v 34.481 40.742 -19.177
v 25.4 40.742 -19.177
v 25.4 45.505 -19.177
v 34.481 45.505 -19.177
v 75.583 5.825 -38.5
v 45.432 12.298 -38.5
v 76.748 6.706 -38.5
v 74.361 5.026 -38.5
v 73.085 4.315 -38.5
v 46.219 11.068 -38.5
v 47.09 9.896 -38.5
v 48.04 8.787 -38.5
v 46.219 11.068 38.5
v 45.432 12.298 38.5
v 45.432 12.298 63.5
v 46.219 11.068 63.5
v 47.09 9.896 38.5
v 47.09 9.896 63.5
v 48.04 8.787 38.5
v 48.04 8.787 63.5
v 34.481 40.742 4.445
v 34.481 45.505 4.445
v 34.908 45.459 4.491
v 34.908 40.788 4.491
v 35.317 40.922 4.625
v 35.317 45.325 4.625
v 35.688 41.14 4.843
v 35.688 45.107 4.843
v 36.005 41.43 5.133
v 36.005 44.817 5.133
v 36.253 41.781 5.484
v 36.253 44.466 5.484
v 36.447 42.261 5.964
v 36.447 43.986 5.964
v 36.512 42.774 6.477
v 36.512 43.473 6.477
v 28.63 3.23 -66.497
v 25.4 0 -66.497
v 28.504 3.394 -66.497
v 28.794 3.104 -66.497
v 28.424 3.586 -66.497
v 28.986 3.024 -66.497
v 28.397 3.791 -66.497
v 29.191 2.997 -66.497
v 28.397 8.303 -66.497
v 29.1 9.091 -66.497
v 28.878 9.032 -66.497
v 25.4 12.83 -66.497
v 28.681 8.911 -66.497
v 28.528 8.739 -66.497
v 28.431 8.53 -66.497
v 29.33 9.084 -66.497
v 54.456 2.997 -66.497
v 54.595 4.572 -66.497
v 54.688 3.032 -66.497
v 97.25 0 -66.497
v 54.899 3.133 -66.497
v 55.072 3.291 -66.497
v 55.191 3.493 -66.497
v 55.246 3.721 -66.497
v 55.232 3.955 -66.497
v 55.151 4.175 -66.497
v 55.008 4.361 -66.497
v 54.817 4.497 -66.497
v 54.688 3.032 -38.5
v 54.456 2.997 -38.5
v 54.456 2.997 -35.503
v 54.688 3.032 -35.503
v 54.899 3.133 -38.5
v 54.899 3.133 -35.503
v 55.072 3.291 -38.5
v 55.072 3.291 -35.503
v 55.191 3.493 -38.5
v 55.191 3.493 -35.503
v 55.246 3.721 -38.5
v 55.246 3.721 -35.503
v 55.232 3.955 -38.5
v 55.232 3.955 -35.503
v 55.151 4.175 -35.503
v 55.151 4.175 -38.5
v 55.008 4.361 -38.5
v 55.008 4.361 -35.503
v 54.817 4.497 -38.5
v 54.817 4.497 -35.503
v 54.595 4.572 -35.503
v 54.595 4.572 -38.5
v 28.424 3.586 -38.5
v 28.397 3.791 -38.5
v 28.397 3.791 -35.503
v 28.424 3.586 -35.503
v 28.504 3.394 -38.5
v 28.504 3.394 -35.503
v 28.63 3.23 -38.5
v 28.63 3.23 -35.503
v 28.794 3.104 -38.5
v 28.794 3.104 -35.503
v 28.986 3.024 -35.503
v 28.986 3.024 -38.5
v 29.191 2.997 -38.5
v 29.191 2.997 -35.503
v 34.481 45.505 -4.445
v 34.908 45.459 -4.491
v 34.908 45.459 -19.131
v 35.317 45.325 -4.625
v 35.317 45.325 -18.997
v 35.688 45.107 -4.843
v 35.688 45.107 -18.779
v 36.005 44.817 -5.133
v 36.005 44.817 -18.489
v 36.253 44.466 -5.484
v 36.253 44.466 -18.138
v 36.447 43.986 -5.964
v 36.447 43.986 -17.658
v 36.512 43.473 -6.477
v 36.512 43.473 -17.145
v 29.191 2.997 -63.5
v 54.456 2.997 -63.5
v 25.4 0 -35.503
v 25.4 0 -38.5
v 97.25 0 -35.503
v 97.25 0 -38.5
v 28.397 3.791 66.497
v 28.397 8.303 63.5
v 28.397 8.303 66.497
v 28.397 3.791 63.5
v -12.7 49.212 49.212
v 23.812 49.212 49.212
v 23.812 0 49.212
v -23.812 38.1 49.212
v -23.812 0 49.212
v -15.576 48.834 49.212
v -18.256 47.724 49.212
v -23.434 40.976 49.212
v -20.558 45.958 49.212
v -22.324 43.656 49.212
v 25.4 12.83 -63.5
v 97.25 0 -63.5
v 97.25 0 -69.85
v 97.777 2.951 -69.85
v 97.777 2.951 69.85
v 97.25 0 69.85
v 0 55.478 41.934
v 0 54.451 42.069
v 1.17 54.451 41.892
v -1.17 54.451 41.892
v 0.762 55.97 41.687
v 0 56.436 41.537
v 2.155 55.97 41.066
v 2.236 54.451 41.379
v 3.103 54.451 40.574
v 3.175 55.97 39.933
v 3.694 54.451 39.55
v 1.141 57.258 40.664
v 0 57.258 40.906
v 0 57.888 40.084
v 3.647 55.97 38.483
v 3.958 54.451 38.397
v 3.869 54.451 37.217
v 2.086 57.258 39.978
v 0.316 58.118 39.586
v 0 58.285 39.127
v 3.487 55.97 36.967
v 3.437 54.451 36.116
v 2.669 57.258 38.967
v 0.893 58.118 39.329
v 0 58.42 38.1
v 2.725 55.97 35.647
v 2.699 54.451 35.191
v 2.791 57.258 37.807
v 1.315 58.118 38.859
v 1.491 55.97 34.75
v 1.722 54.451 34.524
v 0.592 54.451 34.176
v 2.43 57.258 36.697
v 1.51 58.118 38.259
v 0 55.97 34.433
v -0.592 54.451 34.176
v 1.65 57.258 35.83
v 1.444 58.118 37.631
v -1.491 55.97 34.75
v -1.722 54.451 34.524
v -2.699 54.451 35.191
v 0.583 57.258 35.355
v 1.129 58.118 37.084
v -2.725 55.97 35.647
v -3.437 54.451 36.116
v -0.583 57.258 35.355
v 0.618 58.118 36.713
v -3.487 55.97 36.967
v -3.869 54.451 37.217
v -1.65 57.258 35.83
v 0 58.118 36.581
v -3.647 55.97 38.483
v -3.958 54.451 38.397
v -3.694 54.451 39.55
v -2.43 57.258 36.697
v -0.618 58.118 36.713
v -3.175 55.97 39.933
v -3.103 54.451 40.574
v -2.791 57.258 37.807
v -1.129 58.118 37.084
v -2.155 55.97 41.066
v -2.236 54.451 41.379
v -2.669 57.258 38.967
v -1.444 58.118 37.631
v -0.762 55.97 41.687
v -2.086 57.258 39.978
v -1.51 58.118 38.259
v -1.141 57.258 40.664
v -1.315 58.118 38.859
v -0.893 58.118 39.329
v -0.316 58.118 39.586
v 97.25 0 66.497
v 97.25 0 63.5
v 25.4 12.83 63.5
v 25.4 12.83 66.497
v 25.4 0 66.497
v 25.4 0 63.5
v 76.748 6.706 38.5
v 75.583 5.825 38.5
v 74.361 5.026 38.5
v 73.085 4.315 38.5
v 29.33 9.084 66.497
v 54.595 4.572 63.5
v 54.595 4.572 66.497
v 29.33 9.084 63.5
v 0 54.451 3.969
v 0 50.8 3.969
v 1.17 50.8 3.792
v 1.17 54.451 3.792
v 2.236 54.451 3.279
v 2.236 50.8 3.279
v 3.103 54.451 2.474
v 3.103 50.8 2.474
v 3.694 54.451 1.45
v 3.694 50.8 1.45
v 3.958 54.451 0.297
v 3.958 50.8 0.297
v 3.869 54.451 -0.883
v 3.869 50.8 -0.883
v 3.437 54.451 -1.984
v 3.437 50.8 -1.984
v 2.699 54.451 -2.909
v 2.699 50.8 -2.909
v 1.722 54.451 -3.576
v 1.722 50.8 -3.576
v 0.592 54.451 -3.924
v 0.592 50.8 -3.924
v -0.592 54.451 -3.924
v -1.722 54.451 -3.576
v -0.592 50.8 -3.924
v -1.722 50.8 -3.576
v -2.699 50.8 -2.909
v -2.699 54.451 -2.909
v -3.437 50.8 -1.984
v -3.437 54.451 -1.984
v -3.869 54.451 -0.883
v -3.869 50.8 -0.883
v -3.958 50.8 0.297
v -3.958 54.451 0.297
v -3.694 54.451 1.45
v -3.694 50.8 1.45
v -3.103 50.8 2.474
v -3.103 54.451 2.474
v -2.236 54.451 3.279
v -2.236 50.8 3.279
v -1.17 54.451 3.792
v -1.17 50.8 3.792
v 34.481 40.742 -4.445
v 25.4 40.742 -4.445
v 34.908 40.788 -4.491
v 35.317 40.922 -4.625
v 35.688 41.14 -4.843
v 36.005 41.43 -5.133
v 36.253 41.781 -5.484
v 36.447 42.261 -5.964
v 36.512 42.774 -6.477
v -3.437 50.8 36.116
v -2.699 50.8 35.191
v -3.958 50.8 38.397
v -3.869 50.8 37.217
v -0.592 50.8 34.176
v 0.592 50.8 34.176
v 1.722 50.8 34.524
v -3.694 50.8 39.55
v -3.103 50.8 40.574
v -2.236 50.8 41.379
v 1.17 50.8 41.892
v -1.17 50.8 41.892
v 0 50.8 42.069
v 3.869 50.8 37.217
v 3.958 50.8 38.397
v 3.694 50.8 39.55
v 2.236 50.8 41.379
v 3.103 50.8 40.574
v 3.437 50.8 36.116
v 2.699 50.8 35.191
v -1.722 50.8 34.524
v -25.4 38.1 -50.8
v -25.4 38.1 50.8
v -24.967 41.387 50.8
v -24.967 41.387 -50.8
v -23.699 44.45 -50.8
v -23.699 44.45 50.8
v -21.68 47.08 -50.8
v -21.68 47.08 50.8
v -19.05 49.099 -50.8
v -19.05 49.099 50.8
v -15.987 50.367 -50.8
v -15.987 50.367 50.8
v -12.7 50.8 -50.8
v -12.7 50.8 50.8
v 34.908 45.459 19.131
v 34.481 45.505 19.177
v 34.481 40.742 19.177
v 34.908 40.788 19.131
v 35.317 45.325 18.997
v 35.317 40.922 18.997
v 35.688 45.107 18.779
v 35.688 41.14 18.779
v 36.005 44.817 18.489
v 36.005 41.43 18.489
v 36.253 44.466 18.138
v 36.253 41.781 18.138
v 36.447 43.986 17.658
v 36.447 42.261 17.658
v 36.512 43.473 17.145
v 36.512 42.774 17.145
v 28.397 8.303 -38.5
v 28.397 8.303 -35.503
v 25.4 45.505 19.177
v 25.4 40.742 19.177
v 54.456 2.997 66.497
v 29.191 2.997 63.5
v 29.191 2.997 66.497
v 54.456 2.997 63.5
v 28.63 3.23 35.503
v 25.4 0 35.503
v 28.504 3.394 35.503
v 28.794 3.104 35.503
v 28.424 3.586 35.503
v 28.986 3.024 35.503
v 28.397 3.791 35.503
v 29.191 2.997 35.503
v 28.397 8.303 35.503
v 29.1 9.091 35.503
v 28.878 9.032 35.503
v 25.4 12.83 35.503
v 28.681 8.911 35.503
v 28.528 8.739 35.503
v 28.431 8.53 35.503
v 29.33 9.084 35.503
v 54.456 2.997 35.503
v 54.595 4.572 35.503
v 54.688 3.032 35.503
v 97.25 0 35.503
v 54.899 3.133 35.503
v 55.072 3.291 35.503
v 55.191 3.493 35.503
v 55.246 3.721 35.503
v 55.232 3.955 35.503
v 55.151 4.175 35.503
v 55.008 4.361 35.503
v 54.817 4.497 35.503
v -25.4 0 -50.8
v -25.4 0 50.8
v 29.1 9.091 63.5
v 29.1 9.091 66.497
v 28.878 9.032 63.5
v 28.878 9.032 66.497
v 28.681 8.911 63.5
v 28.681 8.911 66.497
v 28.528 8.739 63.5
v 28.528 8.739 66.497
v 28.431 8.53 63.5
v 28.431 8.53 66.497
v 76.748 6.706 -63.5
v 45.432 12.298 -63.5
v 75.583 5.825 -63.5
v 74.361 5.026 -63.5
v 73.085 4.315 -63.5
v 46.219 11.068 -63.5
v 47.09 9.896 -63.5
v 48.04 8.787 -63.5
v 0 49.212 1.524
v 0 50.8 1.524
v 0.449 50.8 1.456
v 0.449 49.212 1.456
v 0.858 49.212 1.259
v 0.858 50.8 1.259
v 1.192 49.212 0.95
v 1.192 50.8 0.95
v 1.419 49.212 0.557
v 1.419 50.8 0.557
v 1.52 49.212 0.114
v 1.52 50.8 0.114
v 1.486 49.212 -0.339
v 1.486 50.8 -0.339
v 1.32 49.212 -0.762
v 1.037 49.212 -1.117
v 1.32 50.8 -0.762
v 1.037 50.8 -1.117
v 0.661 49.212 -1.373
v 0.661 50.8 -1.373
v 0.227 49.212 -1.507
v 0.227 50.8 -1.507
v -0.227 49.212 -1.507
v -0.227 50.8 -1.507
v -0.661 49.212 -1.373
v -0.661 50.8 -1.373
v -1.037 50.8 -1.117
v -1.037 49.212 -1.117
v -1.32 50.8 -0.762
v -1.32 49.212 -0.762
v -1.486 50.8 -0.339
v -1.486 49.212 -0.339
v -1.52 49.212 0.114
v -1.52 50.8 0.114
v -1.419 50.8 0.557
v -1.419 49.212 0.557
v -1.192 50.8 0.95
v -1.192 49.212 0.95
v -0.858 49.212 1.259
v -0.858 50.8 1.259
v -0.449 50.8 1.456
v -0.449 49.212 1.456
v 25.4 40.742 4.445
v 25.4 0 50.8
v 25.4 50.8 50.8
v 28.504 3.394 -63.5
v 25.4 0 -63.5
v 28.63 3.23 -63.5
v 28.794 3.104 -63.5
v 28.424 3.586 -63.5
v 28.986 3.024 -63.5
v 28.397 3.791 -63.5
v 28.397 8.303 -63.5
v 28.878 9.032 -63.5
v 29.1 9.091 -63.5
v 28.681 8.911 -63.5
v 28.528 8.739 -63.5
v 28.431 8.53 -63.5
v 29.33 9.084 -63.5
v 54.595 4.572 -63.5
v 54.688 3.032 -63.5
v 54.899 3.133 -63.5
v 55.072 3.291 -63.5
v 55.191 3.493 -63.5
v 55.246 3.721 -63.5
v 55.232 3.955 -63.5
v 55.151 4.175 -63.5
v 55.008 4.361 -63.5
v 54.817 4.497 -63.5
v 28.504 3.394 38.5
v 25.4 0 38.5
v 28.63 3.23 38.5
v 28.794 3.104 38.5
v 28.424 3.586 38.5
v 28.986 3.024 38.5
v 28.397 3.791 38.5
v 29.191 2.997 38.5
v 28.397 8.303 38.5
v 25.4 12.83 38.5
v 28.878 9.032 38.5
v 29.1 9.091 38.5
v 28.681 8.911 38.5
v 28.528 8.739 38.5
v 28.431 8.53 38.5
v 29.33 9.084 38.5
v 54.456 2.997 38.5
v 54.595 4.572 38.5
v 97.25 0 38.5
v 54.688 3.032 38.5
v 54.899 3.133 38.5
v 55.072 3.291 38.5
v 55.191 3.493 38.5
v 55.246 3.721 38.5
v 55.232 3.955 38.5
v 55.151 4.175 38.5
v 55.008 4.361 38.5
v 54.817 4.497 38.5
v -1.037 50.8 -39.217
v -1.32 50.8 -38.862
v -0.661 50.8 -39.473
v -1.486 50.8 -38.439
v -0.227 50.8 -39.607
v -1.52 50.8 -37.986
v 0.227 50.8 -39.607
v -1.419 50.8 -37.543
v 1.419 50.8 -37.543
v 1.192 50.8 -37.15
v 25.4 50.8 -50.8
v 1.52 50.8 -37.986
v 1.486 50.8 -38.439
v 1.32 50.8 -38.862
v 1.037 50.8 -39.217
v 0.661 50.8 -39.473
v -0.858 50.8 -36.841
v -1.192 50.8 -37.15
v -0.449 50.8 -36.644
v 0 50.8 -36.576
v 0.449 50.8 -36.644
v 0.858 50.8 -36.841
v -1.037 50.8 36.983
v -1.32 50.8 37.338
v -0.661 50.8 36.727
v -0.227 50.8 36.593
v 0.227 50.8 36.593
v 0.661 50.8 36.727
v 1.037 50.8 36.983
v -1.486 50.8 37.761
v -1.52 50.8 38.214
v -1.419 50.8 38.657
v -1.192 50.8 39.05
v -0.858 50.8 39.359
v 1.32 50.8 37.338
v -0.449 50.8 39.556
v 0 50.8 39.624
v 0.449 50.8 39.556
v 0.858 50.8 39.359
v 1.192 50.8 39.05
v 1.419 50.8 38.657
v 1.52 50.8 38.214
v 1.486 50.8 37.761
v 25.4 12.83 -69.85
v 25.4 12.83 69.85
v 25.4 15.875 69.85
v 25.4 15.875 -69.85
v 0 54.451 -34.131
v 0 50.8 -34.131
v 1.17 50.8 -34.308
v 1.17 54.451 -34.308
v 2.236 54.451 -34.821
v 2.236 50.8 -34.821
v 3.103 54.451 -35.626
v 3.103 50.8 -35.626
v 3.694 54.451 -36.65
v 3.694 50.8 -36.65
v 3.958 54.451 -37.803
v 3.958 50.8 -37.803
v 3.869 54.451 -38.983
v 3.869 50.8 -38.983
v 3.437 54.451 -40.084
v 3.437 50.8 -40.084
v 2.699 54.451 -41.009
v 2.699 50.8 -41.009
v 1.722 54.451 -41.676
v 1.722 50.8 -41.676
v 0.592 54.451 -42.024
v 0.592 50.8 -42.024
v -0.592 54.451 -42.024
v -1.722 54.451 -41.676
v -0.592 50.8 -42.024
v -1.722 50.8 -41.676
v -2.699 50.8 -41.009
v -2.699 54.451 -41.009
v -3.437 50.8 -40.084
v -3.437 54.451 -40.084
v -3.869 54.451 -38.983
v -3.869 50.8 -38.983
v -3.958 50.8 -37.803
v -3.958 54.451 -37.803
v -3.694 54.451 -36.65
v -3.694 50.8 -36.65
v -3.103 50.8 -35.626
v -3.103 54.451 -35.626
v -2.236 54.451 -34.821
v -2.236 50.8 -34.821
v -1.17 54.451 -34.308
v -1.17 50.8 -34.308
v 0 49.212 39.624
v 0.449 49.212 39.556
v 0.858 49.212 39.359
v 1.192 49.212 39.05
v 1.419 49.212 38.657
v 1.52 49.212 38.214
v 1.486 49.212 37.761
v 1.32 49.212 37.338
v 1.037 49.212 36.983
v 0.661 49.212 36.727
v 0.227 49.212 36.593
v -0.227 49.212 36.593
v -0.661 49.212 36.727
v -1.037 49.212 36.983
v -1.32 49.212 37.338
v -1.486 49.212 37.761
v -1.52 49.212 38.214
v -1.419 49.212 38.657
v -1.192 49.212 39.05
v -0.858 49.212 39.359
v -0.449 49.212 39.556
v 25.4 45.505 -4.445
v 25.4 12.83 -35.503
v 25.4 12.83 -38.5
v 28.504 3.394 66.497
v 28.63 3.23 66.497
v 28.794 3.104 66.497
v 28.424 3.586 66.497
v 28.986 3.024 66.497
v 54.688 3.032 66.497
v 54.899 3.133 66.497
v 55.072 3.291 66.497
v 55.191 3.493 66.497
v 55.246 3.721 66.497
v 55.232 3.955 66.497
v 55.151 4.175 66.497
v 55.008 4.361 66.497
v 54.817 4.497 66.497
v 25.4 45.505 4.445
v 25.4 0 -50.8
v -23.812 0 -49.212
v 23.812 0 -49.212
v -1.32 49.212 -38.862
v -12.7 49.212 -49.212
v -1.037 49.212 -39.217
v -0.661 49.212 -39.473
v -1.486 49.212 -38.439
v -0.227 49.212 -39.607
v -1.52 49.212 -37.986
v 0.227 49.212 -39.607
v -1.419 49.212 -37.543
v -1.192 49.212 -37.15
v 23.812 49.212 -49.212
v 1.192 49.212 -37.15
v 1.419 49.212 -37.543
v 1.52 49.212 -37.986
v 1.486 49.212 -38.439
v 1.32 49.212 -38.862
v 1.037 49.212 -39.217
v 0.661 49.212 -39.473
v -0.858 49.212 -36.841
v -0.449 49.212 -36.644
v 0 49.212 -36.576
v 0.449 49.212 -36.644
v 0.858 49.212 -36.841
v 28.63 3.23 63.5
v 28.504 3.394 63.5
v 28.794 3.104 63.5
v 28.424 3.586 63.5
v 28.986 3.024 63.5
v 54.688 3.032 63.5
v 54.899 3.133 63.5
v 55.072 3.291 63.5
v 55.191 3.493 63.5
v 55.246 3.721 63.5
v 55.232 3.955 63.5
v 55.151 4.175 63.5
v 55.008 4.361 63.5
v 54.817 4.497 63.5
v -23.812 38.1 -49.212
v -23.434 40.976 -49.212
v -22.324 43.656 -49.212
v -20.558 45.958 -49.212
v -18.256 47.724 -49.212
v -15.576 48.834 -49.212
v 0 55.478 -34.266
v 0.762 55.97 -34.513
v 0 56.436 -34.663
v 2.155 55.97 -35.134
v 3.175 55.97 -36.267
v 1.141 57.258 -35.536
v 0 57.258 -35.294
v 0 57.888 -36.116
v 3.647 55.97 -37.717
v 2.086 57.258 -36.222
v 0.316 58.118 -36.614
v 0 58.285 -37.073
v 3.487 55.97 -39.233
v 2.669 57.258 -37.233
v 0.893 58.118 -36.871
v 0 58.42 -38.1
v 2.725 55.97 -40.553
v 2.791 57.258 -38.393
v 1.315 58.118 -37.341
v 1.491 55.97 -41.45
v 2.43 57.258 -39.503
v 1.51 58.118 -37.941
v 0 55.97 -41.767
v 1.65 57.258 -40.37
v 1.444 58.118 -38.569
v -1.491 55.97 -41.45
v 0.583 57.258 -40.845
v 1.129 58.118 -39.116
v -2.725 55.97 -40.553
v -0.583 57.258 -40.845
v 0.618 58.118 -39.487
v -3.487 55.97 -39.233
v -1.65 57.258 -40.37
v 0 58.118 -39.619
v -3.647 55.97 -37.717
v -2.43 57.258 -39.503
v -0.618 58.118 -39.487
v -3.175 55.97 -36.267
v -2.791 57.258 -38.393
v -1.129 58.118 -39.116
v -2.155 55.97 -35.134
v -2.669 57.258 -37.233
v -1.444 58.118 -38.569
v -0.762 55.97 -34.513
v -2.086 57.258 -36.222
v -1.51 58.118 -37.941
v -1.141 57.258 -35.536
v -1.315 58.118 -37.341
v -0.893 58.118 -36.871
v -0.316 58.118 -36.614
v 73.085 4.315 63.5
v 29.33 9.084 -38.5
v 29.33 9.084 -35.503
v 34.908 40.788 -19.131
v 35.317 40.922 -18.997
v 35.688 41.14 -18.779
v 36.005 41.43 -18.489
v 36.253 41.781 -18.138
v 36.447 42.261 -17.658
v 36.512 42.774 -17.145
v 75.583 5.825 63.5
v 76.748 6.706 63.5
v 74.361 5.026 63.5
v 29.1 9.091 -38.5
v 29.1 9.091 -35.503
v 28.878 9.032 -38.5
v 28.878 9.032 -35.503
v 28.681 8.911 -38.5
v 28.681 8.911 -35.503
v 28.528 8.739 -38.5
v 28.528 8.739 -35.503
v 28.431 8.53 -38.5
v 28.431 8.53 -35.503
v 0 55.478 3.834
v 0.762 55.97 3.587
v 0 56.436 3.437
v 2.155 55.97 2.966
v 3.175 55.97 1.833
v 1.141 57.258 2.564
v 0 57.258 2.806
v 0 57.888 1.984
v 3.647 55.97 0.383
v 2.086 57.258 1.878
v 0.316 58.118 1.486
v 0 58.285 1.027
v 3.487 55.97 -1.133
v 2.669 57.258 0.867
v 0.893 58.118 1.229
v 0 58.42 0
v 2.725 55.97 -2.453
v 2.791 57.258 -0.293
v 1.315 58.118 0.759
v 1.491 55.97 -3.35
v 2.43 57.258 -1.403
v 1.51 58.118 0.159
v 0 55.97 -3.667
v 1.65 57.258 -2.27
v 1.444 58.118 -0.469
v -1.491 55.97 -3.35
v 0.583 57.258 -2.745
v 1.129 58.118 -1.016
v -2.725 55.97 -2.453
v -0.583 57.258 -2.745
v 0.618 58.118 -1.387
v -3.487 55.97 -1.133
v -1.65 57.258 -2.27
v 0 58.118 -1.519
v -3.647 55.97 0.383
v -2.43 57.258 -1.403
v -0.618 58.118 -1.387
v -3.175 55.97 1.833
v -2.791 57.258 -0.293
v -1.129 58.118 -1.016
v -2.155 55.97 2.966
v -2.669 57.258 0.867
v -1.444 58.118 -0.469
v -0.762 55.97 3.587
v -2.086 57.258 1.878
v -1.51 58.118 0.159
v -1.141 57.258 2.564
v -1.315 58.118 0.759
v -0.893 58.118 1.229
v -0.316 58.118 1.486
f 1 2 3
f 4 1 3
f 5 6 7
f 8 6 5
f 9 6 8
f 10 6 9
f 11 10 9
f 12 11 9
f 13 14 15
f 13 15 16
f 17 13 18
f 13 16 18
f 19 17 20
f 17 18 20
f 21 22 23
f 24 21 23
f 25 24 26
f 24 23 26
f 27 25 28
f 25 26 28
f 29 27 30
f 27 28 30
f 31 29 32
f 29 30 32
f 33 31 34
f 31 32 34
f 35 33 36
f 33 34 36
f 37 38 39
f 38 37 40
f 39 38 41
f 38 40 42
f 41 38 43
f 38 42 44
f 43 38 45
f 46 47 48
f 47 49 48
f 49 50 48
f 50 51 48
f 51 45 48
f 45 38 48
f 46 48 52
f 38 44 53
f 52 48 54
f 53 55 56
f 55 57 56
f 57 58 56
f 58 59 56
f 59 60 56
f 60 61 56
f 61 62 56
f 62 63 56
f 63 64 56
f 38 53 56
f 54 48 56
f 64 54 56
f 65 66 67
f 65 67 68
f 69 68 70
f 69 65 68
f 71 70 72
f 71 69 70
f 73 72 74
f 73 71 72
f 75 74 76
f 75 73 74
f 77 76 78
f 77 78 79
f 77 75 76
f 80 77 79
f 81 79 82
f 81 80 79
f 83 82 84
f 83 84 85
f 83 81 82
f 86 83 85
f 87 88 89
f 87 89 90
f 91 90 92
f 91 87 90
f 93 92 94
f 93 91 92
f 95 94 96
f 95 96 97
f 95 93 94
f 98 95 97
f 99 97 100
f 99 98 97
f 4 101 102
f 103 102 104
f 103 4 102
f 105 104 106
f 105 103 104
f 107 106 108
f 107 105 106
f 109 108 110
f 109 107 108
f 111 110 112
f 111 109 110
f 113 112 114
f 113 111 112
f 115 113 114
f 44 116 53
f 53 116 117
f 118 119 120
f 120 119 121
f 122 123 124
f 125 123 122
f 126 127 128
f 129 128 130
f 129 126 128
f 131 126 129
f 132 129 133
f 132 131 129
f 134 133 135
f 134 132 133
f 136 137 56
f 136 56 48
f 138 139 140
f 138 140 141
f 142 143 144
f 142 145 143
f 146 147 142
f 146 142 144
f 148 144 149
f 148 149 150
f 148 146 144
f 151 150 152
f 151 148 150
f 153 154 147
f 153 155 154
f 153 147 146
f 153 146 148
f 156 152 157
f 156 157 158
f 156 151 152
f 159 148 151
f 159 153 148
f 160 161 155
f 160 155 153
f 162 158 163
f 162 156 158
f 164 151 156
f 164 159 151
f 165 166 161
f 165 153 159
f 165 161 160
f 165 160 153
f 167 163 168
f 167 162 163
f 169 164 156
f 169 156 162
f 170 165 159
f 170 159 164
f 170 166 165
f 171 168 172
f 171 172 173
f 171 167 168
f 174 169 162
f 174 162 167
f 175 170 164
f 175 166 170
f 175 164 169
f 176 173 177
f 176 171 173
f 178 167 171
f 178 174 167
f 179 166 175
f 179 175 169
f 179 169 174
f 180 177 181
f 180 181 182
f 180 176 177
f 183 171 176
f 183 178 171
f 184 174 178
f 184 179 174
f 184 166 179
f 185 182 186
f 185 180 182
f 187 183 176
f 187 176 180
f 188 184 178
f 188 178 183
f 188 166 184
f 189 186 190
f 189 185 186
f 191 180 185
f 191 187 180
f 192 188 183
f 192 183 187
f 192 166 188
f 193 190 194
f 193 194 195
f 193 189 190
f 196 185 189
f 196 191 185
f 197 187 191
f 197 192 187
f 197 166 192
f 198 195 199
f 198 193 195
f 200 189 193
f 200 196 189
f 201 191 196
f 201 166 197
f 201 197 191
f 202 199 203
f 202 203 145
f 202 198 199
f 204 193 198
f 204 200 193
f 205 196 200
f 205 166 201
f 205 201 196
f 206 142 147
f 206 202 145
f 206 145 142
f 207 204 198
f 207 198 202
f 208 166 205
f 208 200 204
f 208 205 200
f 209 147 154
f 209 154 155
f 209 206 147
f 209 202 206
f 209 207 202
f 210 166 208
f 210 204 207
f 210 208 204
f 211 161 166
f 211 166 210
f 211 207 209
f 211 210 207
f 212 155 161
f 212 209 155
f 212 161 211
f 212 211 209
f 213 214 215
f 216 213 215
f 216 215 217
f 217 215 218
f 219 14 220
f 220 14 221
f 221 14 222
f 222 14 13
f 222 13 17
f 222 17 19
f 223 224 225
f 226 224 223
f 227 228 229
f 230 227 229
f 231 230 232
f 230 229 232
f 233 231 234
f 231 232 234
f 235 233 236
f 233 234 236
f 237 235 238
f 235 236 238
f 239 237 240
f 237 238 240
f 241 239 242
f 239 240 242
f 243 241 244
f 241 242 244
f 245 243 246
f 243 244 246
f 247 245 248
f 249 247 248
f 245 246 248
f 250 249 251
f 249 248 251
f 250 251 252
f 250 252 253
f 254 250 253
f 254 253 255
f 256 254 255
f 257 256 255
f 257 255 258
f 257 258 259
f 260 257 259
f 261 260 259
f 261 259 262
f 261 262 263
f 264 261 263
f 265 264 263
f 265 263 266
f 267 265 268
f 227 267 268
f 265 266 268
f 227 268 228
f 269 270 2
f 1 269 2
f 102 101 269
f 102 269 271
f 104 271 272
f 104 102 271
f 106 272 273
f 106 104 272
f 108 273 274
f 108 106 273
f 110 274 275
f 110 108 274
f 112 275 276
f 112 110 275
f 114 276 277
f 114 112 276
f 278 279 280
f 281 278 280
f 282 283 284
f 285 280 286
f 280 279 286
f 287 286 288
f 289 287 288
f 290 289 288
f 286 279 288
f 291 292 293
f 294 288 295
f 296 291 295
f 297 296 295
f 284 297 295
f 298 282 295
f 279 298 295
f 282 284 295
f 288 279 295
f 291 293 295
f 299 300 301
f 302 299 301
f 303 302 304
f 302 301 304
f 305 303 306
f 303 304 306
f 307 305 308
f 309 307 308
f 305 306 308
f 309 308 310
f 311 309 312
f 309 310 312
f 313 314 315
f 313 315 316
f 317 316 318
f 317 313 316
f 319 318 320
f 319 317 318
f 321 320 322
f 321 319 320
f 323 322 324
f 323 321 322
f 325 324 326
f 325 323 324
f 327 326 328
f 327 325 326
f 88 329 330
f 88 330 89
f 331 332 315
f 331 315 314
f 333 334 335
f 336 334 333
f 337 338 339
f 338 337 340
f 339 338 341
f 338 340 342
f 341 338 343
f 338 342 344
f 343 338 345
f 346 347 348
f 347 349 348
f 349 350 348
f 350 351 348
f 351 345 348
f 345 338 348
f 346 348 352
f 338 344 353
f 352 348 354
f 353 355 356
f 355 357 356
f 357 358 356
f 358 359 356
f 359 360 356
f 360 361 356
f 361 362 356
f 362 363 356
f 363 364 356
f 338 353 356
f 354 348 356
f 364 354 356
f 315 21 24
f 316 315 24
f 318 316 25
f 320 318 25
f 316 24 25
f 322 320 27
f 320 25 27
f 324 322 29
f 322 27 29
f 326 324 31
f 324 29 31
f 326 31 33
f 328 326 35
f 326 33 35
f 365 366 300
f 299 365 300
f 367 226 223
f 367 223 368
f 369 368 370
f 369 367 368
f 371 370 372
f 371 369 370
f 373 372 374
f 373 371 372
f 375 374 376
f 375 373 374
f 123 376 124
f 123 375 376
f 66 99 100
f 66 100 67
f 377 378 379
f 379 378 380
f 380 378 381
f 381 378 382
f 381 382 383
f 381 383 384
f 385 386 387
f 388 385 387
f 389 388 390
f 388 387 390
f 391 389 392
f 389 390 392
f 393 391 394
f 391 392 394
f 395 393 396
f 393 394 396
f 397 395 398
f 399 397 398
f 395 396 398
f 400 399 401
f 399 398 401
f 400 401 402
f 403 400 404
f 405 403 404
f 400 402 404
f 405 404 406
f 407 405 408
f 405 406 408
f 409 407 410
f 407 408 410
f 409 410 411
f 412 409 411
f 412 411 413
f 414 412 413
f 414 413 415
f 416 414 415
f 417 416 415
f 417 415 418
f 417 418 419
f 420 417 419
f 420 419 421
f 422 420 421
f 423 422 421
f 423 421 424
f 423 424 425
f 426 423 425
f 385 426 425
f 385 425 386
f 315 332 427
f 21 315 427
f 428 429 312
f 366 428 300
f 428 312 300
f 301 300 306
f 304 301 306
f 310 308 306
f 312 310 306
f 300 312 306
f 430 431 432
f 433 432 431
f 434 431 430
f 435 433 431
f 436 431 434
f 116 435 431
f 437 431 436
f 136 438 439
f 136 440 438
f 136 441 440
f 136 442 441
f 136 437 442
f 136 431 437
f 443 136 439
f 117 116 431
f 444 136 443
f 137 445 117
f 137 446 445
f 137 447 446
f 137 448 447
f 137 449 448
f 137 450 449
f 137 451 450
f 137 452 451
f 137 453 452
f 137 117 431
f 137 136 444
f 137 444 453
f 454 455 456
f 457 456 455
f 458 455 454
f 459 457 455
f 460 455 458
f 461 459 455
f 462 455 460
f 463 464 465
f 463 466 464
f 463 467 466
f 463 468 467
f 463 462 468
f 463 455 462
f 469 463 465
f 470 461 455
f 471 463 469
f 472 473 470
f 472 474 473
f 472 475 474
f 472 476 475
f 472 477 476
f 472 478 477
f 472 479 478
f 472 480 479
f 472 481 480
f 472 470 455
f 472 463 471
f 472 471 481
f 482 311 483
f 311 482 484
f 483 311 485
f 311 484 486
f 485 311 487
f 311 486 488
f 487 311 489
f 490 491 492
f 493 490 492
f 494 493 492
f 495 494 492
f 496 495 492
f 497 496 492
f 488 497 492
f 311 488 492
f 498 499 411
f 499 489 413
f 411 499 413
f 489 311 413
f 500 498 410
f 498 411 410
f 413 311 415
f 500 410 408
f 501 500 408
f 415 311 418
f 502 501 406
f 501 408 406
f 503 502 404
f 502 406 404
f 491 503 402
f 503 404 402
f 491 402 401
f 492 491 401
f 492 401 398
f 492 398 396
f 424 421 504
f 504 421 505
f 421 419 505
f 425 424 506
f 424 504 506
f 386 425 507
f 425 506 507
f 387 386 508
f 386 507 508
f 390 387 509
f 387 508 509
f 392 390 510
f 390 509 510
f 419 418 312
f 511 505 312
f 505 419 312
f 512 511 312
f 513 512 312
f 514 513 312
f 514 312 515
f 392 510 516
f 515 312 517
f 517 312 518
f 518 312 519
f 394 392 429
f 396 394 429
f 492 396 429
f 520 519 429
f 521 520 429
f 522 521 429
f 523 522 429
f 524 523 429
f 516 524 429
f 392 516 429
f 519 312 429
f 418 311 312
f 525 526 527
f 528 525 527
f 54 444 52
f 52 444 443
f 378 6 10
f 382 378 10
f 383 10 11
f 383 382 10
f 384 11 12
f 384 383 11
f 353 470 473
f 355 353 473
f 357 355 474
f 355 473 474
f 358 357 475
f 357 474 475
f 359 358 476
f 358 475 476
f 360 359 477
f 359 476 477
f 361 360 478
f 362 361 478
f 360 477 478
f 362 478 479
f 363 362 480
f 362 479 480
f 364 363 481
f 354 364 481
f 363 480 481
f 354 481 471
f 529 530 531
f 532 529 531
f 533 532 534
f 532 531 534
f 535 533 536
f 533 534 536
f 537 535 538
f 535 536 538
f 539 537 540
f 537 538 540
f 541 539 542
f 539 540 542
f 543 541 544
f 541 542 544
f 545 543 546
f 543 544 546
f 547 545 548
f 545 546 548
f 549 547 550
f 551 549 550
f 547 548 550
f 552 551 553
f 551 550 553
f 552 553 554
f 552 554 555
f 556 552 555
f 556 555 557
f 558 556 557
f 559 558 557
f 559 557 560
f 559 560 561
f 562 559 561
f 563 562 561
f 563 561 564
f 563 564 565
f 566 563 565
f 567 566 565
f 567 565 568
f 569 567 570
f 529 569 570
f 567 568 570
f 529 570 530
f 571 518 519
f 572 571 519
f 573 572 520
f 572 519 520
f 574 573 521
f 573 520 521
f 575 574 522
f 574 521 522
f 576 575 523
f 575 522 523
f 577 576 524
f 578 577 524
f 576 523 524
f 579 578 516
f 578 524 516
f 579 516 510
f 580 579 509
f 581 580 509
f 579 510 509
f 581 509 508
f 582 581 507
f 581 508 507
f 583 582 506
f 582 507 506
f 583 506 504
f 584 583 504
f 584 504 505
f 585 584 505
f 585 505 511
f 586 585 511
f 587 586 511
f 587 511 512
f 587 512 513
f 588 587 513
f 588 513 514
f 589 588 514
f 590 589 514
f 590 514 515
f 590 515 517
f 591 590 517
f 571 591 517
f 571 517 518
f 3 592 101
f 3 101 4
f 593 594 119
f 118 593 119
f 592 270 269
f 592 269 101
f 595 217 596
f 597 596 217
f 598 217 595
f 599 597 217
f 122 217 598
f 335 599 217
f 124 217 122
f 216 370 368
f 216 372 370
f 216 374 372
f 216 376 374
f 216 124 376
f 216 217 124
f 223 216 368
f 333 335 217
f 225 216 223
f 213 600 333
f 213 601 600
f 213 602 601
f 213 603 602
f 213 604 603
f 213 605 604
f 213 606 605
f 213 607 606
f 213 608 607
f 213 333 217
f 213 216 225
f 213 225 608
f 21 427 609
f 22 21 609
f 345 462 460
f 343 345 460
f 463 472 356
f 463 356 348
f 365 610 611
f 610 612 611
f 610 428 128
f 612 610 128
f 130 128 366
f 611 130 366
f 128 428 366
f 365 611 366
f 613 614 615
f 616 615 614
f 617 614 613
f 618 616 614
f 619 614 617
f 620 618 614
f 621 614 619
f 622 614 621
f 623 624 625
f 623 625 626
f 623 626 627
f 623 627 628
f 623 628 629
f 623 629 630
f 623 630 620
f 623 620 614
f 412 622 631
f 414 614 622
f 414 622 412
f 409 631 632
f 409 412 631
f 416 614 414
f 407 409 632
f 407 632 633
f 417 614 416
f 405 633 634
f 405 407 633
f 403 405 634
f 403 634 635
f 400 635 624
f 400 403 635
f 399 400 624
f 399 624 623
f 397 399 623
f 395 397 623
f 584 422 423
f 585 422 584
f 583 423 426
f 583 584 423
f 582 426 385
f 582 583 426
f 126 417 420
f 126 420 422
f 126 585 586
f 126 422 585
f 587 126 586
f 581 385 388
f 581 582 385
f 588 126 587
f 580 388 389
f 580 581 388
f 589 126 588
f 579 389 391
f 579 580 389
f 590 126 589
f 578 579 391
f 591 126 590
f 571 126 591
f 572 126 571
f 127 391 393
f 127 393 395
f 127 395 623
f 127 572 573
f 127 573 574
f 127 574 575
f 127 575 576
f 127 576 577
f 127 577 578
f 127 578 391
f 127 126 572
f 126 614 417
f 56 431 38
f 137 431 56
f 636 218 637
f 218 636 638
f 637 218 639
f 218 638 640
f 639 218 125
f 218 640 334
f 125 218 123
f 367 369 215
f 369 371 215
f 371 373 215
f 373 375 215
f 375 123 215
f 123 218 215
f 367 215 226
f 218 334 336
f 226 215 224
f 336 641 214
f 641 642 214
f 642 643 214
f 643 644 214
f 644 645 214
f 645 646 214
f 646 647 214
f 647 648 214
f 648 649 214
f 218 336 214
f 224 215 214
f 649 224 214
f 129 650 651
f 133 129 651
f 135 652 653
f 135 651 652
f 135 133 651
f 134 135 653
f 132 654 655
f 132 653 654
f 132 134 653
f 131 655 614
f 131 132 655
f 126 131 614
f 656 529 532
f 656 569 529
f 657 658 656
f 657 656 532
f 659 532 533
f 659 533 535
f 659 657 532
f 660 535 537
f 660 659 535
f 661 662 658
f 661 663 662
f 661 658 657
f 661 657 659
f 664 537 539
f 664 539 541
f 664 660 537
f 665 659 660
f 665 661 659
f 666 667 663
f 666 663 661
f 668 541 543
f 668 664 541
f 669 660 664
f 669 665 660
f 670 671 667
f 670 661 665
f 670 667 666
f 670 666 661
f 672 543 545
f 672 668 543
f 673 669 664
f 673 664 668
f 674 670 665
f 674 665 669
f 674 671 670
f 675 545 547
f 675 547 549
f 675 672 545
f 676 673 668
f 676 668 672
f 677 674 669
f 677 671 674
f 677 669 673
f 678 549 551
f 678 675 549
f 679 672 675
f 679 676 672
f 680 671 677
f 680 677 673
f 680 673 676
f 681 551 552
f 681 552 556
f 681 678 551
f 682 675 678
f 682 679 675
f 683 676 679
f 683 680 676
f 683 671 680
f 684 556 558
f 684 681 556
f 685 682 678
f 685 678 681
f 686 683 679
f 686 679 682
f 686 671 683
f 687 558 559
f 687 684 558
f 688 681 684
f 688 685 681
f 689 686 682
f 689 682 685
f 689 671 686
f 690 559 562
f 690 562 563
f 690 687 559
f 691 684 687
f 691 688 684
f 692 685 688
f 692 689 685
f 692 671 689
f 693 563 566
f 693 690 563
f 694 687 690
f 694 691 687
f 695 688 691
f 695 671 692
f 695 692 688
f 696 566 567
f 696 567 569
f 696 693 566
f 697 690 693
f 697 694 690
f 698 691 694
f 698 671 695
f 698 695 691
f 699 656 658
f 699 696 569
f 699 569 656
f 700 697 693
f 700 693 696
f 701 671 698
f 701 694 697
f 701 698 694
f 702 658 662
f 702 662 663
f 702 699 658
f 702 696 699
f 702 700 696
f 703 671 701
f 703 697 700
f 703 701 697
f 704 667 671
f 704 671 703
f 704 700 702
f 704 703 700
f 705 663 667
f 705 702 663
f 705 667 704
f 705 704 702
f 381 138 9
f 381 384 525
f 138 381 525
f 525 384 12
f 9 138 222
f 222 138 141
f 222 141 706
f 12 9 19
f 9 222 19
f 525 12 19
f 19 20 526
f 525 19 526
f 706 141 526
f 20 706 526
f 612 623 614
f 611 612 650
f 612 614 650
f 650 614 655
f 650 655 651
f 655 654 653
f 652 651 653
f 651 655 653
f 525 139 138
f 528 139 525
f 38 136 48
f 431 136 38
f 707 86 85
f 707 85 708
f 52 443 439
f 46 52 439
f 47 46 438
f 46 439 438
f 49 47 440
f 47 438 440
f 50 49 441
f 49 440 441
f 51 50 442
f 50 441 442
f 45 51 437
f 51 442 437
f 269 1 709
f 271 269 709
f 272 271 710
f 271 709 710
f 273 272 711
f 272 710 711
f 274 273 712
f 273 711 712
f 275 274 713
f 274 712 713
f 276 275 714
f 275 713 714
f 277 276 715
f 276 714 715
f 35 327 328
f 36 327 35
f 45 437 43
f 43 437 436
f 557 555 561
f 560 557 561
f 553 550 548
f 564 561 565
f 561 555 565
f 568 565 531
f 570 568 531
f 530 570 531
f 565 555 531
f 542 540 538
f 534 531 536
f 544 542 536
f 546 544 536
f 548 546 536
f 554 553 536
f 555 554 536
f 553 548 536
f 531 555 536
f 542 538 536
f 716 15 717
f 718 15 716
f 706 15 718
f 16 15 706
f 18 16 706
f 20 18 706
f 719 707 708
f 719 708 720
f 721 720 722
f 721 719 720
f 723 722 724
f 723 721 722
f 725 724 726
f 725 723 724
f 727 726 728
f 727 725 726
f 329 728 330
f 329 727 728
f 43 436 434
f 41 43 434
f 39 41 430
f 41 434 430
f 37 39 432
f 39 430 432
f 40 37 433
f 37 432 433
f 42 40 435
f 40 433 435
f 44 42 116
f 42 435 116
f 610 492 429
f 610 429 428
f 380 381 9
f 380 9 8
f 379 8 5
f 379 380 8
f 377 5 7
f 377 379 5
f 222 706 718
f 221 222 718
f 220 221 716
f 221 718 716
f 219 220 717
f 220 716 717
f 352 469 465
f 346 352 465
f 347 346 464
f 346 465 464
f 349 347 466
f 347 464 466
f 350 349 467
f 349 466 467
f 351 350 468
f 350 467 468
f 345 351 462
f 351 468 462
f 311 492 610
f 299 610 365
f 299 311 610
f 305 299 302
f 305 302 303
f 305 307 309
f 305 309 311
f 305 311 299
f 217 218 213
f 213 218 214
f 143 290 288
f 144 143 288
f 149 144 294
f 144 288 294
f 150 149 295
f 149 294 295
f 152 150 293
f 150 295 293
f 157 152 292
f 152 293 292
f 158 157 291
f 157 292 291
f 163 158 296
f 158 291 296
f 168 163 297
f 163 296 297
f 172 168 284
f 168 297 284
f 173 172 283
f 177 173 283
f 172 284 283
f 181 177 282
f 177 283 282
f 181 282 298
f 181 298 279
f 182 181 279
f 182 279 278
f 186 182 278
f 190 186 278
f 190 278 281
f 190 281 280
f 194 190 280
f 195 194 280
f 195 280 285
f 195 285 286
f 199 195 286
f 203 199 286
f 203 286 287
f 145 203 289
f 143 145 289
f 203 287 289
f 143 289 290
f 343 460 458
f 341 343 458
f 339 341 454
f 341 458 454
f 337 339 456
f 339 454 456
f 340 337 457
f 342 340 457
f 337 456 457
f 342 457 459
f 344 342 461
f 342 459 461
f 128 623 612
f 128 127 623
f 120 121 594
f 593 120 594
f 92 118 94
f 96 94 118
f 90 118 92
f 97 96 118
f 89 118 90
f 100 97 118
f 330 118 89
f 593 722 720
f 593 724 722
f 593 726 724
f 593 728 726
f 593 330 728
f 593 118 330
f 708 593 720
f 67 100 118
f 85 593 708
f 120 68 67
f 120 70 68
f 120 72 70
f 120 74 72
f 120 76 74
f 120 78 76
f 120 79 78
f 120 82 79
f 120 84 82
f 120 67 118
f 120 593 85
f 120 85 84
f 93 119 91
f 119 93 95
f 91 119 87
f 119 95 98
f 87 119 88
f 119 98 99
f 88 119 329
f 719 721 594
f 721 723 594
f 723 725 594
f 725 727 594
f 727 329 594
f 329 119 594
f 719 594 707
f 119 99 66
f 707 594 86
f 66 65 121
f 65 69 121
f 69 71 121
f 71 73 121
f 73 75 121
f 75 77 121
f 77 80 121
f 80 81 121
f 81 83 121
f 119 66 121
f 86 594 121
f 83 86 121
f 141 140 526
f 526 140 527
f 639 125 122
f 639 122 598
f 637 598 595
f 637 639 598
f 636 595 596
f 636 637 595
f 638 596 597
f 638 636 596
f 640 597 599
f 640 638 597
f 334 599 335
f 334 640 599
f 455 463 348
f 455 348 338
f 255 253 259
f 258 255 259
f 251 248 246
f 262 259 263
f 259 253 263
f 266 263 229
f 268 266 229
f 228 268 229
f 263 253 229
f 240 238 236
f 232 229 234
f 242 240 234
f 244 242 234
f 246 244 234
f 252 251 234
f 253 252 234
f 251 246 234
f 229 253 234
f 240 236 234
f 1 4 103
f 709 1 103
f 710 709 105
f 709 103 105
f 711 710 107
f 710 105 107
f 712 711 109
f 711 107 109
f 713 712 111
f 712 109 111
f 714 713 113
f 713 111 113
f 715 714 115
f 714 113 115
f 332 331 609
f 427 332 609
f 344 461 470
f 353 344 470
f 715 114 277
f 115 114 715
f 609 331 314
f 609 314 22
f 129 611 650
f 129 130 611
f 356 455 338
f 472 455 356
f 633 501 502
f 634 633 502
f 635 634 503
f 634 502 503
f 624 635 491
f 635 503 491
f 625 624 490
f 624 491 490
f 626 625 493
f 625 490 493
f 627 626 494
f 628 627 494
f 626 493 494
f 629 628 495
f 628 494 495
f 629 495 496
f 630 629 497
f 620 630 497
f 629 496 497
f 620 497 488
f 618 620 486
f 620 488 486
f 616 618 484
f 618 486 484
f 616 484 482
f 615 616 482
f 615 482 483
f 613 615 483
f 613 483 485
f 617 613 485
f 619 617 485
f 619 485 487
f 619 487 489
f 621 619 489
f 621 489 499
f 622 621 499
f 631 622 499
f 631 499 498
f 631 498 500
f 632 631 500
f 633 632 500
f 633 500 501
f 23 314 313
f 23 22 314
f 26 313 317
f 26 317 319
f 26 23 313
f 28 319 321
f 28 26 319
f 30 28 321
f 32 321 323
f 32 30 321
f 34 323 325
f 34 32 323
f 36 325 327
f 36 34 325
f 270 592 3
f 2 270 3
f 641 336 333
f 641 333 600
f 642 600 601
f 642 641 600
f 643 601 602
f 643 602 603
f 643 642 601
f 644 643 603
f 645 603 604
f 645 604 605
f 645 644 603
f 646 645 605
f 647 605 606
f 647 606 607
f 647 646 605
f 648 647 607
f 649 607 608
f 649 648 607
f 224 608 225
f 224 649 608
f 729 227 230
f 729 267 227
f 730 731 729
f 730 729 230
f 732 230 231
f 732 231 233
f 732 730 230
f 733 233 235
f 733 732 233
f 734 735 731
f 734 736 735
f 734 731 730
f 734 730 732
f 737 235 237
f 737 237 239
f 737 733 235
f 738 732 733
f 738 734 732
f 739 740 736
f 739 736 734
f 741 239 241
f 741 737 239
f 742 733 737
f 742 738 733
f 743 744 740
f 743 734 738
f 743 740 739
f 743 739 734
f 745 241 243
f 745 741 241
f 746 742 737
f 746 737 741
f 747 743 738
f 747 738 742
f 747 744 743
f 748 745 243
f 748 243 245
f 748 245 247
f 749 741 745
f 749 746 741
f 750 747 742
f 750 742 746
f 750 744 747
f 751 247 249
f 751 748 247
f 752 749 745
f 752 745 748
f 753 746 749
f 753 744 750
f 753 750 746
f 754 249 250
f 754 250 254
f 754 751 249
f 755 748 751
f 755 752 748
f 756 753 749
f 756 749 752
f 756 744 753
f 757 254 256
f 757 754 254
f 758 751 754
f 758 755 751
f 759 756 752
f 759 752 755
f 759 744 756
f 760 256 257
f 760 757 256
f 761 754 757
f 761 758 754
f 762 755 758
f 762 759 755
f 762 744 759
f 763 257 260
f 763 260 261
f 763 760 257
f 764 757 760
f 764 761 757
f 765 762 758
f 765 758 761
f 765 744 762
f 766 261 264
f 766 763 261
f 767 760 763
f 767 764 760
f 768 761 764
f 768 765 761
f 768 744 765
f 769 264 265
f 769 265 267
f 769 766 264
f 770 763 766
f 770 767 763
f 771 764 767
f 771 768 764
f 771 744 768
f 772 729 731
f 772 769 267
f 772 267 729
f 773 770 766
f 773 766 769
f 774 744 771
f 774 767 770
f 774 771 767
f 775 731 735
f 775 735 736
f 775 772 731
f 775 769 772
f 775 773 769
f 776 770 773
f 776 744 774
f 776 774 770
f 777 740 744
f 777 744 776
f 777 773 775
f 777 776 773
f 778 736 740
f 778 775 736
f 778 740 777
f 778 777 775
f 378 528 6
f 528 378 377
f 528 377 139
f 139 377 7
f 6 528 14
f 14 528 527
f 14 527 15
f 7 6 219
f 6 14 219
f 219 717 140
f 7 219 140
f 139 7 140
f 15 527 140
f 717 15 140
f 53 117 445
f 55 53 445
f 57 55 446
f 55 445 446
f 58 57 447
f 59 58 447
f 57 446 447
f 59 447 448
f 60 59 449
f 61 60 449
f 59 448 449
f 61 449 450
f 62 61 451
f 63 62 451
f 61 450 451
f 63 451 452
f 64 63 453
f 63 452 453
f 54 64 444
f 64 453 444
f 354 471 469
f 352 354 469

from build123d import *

# Parameters (mm, degrees)
EXTRUDE1_DEPTH   = 50.8
SHELL1_T         = -1.5875
EXTRUDE2_REACH   = 52.8
SKETCH2_R        = 1.524
EXTRUDE3_DEPTH   = 69.85
EXTRUDE4_DEPTH   = 25
SKETCH5_W        = 14.732
SKETCH5_H        = 4.7625
EXTRUDE5_DEPTH   = 11.1125
EXTRUDE5_2_DEPTH = 11.1125
FILLET3_R        = 2.032
FILLET4_R        = 2.032
SKETCH6_R        = 3.96875
EXTRUDE6_DEPTH   = 7.62
EXTRUDE6_2_DEPTH = 7.62
EXTRUDE6_3_DEPTH = 7.62
FILLET5_R        = 3.96875
FILLET6_R        = 3.96875
FILLET7_R        = 3.96875
EXTRUDE7_DEPTH   = 2.9972
EXTRUDE8_DEPTH   = 2.9972


with BuildPart() as part:
    # Sketch1 → Extrude1 (new body, symmetric)
    with BuildSketch(Plane.XY):
        with BuildLine():
            Line((-12.7, 50.8), (25.4, 50.8))
            Line((25.4, 50.8), (25.4, 0))
            Line((25.4, 0), (-25.4, 0))
            Line((-25.4, 0), (-25.4, 38.1))
            ThreePointArc((-25.4, 38.1), (-21.680256121, 47.080256121), (-12.7, 50.8))
        make_face()
    extrude(amount=EXTRUDE1_DEPTH, both=True)

    # Shell1
    shell1_openings = [part.faces().sort_by_distance(p)[0] for p in [
        (0, 0, 0),
    ]]
    offset(amount=SHELL1_T, openings=shell1_openings, kind=Kind.INTERSECTION)

    # Sketch2 → Extrude2 (cut, up to next)
    with BuildSketch(Plane(origin=(0, 50.8, 0), x_dir=(-1, 0, 0), z_dir=(0, 1, 0)), mode=Mode.PRIVATE) as extrude2_sk1:
        with Locations(Location((0, 0, 0), (0, 0, 90))):  # turned: the seam where the file's is
            Circle(SKETCH2_R)
    extrude2_tool1 = extrude(extrude2_sk1.sketch, amount=-EXTRUDE2_REACH, mode=Mode.PRIVATE) & part.part
    add(extrude2_tool1.solids().sort_by_distance((0, 50.8, 0))[0], mode=Mode.SUBTRACT)
    # Sketch2 → Extrude2 (cut, up to next)
    with BuildSketch(Plane(origin=(0, 50.8, 0), x_dir=(-1, 0, 0), z_dir=(0, 1, 0)), mode=Mode.PRIVATE) as extrude2_sk2:
        with Locations(Location((0, -38.1, 0), (0, 0, 90))):  # turned: the seam where the file's is
            Circle(SKETCH2_R)
    extrude2_tool2 = extrude(extrude2_sk2.sketch, amount=-EXTRUDE2_REACH, mode=Mode.PRIVATE) & part.part
    add(extrude2_tool2.solids().sort_by_distance((0, 50.8, -38.1))[0], mode=Mode.SUBTRACT)
    # Sketch2 → Extrude2 (cut, up to next)
    with BuildSketch(Plane(origin=(0, 50.8, 0), x_dir=(-1, 0, 0), z_dir=(0, 1, 0)), mode=Mode.PRIVATE) as extrude2_sk3:
        with Locations(Location((0, 38.1, 0), (0, 0, 90))):  # turned: the seam where the file's is
            Circle(SKETCH2_R)
    extrude2_tool3 = extrude(extrude2_sk3.sketch, amount=-EXTRUDE2_REACH, mode=Mode.PRIVATE) & part.part
    add(extrude2_tool3.solids().sort_by_distance((0, 50.8, 38.1))[0], mode=Mode.SUBTRACT)


with BuildPart() as body_2:
    # Sketch3 → Extrude3 (new body, symmetric)
    with BuildSketch(Plane.XY):
        Polygon((25.4, 15.875), (97.777052556, 2.950526329), (97.250172854, 0), (25.4, 12.83038801), align=None)
    extrude(amount=EXTRUDE3_DEPTH, both=True)

    # Sketch4 → Extrude4 (cut)
    with BuildSketch(Plane.XY.offset(63.5)):
        with BuildLine():
            Line((76.747589944, 6.70578751), (45.431643678, 12.297920772))
            ThreePointArc((45.431643678, 12.297920772), (59.808396592, 2.327020914), (76.747589944, 6.70578751))
        make_face()
    extrude4 = extrude(amount=-EXTRUDE4_DEPTH, mode=Mode.SUBTRACT)

    # Mirror1: Extrude4 across plane
    add(extrude4.mirror(Plane.XY), mode=Mode.SUBTRACT)


with BuildPart() as body_3:
    # Sketch5 → Extrude5 (new body)
    with BuildSketch(Plane(origin=(25.4, 0, 0), x_dir=(0, 0, -1), z_dir=(1, 0, 0))):
        with Locations((-11.811, 43.123528776)):
            Rectangle(SKETCH5_W, SKETCH5_H)
    extrude(amount=EXTRUDE5_DEPTH)

    # Fillet3
    fillet3_edges = [body_3.edges().sort_by_distance(p)[0] for p in [
        (36.5125, 43.123528776, 4.445),
        (36.5125, 45.504778776, 11.811),
        (36.5125, 43.123528776, 19.177),
        (36.5125, 40.742278776, 11.811),
    ]]
    fillet(fillet3_edges, radius=FILLET3_R)


with BuildPart() as body_4:
    # Sketch5 → Extrude5 2 (new body)
    with BuildSketch(Plane(origin=(25.4, 0, 0), x_dir=(0, 0, -1), z_dir=(1, 0, 0))):
        with Locations((11.811, 43.123528776)):
            Rectangle(SKETCH5_W, SKETCH5_H)
    extrude(amount=EXTRUDE5_2_DEPTH)

    # Fillet4
    fillet4_edges = [body_4.edges().sort_by_distance(p)[0] for p in [
        (36.5125, 40.742278776, -11.811),
        (36.5125, 43.123528776, -19.177),
        (36.5125, 45.504778776, -11.811),
        (36.5125, 43.123528776, -4.445),
    ]]
    fillet(fillet4_edges, radius=FILLET4_R)


with BuildPart() as body_5:
    # Sketch6 → Extrude6 (new body)
    with BuildSketch(Plane(origin=(0, 50.8, 0), x_dir=(1, 0, 0), z_dir=(0, 1, 0))):
        with Locations(Location((0, 38.1, 0), (0, 0, 270))):  # turned: the seam where the file's is
            Circle(SKETCH6_R)
    extrude(amount=EXTRUDE6_DEPTH)

    # Fillet7
    fillet7_edges = [body_5.edges().sort_by_distance(p)[0] for p in [
        (0, 58.42, -42.06875),
    ]]
    fillet(fillet7_edges, radius=FILLET7_R)


with BuildPart() as body_6:
    # Sketch6 → Extrude6 2 (new body)
    with BuildSketch(Plane(origin=(0, 50.8, 0), x_dir=(1, 0, 0), z_dir=(0, 1, 0))):
        with Locations(Location((0, 0, 0), (0, 0, 270))):  # turned: the seam where the file's is
            Circle(SKETCH6_R)
    extrude(amount=EXTRUDE6_2_DEPTH)

    # Fillet6
    fillet6_edges = [body_6.edges().sort_by_distance(p)[0] for p in [
        (0, 58.42, -3.96875),
    ]]
    fillet(fillet6_edges, radius=FILLET6_R)


with BuildPart() as body_7:
    # Sketch6 → Extrude6 3 (new body)
    with BuildSketch(Plane(origin=(0, 50.8, 0), x_dir=(1, 0, 0), z_dir=(0, 1, 0))):
        with Locations(Location((0, -38.1, 0), (0, 0, 270))):  # turned: the seam where the file's is
            Circle(SKETCH6_R)
    extrude(amount=EXTRUDE6_3_DEPTH)

    # Fillet5
    fillet5_edges = [body_7.edges().sort_by_distance(p)[0] for p in [
        (0, 58.42, 34.13125),
    ]]
    fillet(fillet5_edges, radius=FILLET5_R)


with BuildPart() as body_8:
    # Sketch7 → Extrude7 (new body)
    with BuildSketch(Plane.XY.offset(63.5)):
        Polygon((25.4, 12.83038801), (25.4, 0), (97.250172854, 0), align=None)
        with BuildLine():
            Line((54.595245135, 4.572339388), (29.330483819, 9.083903909))
            ThreePointArc((29.330483819, 9.083903909), (28.681399172, 8.911117031), (28.3972, 8.302514521))
            Line((28.3972, 8.302514521), (28.3972, 3.79095))
            ThreePointArc((28.3972, 3.79095), (28.629683992, 3.229683992), (29.19095, 2.9972))
            Line((29.19095, 2.9972), (54.455711316, 2.9972))
            ThreePointArc((54.455711316, 2.9972), (55.246365124, 3.720909884), (54.595245135, 4.572339388))
        make_face(mode=Mode.SUBTRACT)
    extrude(amount=EXTRUDE7_DEPTH)


with BuildPart() as body_9:
    # Sketch8 → Extrude8 (new body)
    with BuildSketch(Plane.XY.offset(38.5)):
        Polygon((97.250172854, 0), (25.4, 12.83038801), (25.4, 0), align=None)
        with BuildLine():
            Line((28.3972, 8.302514521), (28.3972, 3.79095))
            ThreePointArc((28.3972, 3.79095), (28.629683992, 3.229683992), (29.19095, 2.9972))
            Line((29.19095, 2.9972), (54.455711316, 2.9972))
            ThreePointArc((54.455711316, 2.9972), (55.246365124, 3.720909884), (54.595245135, 4.572339388))
            Line((54.595245135, 4.572339388), (29.330483819, 9.083903909))
            ThreePointArc((29.330483819, 9.083903909), (28.681399172, 8.911117031), (28.3972, 8.302514521))
        make_face(mode=Mode.SUBTRACT)
    extrude(amount=-EXTRUDE8_DEPTH)


with BuildPart() as body_10:
    # Mirror2: mirrored copy
    add(body_8.part.mirror(Plane.XY))


with BuildPart() as body_11:
    # Mirror2 2: mirrored copy
    add(body_9.part.mirror(Plane.XY))


solid = Compound([part.part, body_2.part, body_3.part, body_4.part, body_5.part, body_6.part, body_7.part, body_8.part, body_9.part, body_10.part, body_11.part])
